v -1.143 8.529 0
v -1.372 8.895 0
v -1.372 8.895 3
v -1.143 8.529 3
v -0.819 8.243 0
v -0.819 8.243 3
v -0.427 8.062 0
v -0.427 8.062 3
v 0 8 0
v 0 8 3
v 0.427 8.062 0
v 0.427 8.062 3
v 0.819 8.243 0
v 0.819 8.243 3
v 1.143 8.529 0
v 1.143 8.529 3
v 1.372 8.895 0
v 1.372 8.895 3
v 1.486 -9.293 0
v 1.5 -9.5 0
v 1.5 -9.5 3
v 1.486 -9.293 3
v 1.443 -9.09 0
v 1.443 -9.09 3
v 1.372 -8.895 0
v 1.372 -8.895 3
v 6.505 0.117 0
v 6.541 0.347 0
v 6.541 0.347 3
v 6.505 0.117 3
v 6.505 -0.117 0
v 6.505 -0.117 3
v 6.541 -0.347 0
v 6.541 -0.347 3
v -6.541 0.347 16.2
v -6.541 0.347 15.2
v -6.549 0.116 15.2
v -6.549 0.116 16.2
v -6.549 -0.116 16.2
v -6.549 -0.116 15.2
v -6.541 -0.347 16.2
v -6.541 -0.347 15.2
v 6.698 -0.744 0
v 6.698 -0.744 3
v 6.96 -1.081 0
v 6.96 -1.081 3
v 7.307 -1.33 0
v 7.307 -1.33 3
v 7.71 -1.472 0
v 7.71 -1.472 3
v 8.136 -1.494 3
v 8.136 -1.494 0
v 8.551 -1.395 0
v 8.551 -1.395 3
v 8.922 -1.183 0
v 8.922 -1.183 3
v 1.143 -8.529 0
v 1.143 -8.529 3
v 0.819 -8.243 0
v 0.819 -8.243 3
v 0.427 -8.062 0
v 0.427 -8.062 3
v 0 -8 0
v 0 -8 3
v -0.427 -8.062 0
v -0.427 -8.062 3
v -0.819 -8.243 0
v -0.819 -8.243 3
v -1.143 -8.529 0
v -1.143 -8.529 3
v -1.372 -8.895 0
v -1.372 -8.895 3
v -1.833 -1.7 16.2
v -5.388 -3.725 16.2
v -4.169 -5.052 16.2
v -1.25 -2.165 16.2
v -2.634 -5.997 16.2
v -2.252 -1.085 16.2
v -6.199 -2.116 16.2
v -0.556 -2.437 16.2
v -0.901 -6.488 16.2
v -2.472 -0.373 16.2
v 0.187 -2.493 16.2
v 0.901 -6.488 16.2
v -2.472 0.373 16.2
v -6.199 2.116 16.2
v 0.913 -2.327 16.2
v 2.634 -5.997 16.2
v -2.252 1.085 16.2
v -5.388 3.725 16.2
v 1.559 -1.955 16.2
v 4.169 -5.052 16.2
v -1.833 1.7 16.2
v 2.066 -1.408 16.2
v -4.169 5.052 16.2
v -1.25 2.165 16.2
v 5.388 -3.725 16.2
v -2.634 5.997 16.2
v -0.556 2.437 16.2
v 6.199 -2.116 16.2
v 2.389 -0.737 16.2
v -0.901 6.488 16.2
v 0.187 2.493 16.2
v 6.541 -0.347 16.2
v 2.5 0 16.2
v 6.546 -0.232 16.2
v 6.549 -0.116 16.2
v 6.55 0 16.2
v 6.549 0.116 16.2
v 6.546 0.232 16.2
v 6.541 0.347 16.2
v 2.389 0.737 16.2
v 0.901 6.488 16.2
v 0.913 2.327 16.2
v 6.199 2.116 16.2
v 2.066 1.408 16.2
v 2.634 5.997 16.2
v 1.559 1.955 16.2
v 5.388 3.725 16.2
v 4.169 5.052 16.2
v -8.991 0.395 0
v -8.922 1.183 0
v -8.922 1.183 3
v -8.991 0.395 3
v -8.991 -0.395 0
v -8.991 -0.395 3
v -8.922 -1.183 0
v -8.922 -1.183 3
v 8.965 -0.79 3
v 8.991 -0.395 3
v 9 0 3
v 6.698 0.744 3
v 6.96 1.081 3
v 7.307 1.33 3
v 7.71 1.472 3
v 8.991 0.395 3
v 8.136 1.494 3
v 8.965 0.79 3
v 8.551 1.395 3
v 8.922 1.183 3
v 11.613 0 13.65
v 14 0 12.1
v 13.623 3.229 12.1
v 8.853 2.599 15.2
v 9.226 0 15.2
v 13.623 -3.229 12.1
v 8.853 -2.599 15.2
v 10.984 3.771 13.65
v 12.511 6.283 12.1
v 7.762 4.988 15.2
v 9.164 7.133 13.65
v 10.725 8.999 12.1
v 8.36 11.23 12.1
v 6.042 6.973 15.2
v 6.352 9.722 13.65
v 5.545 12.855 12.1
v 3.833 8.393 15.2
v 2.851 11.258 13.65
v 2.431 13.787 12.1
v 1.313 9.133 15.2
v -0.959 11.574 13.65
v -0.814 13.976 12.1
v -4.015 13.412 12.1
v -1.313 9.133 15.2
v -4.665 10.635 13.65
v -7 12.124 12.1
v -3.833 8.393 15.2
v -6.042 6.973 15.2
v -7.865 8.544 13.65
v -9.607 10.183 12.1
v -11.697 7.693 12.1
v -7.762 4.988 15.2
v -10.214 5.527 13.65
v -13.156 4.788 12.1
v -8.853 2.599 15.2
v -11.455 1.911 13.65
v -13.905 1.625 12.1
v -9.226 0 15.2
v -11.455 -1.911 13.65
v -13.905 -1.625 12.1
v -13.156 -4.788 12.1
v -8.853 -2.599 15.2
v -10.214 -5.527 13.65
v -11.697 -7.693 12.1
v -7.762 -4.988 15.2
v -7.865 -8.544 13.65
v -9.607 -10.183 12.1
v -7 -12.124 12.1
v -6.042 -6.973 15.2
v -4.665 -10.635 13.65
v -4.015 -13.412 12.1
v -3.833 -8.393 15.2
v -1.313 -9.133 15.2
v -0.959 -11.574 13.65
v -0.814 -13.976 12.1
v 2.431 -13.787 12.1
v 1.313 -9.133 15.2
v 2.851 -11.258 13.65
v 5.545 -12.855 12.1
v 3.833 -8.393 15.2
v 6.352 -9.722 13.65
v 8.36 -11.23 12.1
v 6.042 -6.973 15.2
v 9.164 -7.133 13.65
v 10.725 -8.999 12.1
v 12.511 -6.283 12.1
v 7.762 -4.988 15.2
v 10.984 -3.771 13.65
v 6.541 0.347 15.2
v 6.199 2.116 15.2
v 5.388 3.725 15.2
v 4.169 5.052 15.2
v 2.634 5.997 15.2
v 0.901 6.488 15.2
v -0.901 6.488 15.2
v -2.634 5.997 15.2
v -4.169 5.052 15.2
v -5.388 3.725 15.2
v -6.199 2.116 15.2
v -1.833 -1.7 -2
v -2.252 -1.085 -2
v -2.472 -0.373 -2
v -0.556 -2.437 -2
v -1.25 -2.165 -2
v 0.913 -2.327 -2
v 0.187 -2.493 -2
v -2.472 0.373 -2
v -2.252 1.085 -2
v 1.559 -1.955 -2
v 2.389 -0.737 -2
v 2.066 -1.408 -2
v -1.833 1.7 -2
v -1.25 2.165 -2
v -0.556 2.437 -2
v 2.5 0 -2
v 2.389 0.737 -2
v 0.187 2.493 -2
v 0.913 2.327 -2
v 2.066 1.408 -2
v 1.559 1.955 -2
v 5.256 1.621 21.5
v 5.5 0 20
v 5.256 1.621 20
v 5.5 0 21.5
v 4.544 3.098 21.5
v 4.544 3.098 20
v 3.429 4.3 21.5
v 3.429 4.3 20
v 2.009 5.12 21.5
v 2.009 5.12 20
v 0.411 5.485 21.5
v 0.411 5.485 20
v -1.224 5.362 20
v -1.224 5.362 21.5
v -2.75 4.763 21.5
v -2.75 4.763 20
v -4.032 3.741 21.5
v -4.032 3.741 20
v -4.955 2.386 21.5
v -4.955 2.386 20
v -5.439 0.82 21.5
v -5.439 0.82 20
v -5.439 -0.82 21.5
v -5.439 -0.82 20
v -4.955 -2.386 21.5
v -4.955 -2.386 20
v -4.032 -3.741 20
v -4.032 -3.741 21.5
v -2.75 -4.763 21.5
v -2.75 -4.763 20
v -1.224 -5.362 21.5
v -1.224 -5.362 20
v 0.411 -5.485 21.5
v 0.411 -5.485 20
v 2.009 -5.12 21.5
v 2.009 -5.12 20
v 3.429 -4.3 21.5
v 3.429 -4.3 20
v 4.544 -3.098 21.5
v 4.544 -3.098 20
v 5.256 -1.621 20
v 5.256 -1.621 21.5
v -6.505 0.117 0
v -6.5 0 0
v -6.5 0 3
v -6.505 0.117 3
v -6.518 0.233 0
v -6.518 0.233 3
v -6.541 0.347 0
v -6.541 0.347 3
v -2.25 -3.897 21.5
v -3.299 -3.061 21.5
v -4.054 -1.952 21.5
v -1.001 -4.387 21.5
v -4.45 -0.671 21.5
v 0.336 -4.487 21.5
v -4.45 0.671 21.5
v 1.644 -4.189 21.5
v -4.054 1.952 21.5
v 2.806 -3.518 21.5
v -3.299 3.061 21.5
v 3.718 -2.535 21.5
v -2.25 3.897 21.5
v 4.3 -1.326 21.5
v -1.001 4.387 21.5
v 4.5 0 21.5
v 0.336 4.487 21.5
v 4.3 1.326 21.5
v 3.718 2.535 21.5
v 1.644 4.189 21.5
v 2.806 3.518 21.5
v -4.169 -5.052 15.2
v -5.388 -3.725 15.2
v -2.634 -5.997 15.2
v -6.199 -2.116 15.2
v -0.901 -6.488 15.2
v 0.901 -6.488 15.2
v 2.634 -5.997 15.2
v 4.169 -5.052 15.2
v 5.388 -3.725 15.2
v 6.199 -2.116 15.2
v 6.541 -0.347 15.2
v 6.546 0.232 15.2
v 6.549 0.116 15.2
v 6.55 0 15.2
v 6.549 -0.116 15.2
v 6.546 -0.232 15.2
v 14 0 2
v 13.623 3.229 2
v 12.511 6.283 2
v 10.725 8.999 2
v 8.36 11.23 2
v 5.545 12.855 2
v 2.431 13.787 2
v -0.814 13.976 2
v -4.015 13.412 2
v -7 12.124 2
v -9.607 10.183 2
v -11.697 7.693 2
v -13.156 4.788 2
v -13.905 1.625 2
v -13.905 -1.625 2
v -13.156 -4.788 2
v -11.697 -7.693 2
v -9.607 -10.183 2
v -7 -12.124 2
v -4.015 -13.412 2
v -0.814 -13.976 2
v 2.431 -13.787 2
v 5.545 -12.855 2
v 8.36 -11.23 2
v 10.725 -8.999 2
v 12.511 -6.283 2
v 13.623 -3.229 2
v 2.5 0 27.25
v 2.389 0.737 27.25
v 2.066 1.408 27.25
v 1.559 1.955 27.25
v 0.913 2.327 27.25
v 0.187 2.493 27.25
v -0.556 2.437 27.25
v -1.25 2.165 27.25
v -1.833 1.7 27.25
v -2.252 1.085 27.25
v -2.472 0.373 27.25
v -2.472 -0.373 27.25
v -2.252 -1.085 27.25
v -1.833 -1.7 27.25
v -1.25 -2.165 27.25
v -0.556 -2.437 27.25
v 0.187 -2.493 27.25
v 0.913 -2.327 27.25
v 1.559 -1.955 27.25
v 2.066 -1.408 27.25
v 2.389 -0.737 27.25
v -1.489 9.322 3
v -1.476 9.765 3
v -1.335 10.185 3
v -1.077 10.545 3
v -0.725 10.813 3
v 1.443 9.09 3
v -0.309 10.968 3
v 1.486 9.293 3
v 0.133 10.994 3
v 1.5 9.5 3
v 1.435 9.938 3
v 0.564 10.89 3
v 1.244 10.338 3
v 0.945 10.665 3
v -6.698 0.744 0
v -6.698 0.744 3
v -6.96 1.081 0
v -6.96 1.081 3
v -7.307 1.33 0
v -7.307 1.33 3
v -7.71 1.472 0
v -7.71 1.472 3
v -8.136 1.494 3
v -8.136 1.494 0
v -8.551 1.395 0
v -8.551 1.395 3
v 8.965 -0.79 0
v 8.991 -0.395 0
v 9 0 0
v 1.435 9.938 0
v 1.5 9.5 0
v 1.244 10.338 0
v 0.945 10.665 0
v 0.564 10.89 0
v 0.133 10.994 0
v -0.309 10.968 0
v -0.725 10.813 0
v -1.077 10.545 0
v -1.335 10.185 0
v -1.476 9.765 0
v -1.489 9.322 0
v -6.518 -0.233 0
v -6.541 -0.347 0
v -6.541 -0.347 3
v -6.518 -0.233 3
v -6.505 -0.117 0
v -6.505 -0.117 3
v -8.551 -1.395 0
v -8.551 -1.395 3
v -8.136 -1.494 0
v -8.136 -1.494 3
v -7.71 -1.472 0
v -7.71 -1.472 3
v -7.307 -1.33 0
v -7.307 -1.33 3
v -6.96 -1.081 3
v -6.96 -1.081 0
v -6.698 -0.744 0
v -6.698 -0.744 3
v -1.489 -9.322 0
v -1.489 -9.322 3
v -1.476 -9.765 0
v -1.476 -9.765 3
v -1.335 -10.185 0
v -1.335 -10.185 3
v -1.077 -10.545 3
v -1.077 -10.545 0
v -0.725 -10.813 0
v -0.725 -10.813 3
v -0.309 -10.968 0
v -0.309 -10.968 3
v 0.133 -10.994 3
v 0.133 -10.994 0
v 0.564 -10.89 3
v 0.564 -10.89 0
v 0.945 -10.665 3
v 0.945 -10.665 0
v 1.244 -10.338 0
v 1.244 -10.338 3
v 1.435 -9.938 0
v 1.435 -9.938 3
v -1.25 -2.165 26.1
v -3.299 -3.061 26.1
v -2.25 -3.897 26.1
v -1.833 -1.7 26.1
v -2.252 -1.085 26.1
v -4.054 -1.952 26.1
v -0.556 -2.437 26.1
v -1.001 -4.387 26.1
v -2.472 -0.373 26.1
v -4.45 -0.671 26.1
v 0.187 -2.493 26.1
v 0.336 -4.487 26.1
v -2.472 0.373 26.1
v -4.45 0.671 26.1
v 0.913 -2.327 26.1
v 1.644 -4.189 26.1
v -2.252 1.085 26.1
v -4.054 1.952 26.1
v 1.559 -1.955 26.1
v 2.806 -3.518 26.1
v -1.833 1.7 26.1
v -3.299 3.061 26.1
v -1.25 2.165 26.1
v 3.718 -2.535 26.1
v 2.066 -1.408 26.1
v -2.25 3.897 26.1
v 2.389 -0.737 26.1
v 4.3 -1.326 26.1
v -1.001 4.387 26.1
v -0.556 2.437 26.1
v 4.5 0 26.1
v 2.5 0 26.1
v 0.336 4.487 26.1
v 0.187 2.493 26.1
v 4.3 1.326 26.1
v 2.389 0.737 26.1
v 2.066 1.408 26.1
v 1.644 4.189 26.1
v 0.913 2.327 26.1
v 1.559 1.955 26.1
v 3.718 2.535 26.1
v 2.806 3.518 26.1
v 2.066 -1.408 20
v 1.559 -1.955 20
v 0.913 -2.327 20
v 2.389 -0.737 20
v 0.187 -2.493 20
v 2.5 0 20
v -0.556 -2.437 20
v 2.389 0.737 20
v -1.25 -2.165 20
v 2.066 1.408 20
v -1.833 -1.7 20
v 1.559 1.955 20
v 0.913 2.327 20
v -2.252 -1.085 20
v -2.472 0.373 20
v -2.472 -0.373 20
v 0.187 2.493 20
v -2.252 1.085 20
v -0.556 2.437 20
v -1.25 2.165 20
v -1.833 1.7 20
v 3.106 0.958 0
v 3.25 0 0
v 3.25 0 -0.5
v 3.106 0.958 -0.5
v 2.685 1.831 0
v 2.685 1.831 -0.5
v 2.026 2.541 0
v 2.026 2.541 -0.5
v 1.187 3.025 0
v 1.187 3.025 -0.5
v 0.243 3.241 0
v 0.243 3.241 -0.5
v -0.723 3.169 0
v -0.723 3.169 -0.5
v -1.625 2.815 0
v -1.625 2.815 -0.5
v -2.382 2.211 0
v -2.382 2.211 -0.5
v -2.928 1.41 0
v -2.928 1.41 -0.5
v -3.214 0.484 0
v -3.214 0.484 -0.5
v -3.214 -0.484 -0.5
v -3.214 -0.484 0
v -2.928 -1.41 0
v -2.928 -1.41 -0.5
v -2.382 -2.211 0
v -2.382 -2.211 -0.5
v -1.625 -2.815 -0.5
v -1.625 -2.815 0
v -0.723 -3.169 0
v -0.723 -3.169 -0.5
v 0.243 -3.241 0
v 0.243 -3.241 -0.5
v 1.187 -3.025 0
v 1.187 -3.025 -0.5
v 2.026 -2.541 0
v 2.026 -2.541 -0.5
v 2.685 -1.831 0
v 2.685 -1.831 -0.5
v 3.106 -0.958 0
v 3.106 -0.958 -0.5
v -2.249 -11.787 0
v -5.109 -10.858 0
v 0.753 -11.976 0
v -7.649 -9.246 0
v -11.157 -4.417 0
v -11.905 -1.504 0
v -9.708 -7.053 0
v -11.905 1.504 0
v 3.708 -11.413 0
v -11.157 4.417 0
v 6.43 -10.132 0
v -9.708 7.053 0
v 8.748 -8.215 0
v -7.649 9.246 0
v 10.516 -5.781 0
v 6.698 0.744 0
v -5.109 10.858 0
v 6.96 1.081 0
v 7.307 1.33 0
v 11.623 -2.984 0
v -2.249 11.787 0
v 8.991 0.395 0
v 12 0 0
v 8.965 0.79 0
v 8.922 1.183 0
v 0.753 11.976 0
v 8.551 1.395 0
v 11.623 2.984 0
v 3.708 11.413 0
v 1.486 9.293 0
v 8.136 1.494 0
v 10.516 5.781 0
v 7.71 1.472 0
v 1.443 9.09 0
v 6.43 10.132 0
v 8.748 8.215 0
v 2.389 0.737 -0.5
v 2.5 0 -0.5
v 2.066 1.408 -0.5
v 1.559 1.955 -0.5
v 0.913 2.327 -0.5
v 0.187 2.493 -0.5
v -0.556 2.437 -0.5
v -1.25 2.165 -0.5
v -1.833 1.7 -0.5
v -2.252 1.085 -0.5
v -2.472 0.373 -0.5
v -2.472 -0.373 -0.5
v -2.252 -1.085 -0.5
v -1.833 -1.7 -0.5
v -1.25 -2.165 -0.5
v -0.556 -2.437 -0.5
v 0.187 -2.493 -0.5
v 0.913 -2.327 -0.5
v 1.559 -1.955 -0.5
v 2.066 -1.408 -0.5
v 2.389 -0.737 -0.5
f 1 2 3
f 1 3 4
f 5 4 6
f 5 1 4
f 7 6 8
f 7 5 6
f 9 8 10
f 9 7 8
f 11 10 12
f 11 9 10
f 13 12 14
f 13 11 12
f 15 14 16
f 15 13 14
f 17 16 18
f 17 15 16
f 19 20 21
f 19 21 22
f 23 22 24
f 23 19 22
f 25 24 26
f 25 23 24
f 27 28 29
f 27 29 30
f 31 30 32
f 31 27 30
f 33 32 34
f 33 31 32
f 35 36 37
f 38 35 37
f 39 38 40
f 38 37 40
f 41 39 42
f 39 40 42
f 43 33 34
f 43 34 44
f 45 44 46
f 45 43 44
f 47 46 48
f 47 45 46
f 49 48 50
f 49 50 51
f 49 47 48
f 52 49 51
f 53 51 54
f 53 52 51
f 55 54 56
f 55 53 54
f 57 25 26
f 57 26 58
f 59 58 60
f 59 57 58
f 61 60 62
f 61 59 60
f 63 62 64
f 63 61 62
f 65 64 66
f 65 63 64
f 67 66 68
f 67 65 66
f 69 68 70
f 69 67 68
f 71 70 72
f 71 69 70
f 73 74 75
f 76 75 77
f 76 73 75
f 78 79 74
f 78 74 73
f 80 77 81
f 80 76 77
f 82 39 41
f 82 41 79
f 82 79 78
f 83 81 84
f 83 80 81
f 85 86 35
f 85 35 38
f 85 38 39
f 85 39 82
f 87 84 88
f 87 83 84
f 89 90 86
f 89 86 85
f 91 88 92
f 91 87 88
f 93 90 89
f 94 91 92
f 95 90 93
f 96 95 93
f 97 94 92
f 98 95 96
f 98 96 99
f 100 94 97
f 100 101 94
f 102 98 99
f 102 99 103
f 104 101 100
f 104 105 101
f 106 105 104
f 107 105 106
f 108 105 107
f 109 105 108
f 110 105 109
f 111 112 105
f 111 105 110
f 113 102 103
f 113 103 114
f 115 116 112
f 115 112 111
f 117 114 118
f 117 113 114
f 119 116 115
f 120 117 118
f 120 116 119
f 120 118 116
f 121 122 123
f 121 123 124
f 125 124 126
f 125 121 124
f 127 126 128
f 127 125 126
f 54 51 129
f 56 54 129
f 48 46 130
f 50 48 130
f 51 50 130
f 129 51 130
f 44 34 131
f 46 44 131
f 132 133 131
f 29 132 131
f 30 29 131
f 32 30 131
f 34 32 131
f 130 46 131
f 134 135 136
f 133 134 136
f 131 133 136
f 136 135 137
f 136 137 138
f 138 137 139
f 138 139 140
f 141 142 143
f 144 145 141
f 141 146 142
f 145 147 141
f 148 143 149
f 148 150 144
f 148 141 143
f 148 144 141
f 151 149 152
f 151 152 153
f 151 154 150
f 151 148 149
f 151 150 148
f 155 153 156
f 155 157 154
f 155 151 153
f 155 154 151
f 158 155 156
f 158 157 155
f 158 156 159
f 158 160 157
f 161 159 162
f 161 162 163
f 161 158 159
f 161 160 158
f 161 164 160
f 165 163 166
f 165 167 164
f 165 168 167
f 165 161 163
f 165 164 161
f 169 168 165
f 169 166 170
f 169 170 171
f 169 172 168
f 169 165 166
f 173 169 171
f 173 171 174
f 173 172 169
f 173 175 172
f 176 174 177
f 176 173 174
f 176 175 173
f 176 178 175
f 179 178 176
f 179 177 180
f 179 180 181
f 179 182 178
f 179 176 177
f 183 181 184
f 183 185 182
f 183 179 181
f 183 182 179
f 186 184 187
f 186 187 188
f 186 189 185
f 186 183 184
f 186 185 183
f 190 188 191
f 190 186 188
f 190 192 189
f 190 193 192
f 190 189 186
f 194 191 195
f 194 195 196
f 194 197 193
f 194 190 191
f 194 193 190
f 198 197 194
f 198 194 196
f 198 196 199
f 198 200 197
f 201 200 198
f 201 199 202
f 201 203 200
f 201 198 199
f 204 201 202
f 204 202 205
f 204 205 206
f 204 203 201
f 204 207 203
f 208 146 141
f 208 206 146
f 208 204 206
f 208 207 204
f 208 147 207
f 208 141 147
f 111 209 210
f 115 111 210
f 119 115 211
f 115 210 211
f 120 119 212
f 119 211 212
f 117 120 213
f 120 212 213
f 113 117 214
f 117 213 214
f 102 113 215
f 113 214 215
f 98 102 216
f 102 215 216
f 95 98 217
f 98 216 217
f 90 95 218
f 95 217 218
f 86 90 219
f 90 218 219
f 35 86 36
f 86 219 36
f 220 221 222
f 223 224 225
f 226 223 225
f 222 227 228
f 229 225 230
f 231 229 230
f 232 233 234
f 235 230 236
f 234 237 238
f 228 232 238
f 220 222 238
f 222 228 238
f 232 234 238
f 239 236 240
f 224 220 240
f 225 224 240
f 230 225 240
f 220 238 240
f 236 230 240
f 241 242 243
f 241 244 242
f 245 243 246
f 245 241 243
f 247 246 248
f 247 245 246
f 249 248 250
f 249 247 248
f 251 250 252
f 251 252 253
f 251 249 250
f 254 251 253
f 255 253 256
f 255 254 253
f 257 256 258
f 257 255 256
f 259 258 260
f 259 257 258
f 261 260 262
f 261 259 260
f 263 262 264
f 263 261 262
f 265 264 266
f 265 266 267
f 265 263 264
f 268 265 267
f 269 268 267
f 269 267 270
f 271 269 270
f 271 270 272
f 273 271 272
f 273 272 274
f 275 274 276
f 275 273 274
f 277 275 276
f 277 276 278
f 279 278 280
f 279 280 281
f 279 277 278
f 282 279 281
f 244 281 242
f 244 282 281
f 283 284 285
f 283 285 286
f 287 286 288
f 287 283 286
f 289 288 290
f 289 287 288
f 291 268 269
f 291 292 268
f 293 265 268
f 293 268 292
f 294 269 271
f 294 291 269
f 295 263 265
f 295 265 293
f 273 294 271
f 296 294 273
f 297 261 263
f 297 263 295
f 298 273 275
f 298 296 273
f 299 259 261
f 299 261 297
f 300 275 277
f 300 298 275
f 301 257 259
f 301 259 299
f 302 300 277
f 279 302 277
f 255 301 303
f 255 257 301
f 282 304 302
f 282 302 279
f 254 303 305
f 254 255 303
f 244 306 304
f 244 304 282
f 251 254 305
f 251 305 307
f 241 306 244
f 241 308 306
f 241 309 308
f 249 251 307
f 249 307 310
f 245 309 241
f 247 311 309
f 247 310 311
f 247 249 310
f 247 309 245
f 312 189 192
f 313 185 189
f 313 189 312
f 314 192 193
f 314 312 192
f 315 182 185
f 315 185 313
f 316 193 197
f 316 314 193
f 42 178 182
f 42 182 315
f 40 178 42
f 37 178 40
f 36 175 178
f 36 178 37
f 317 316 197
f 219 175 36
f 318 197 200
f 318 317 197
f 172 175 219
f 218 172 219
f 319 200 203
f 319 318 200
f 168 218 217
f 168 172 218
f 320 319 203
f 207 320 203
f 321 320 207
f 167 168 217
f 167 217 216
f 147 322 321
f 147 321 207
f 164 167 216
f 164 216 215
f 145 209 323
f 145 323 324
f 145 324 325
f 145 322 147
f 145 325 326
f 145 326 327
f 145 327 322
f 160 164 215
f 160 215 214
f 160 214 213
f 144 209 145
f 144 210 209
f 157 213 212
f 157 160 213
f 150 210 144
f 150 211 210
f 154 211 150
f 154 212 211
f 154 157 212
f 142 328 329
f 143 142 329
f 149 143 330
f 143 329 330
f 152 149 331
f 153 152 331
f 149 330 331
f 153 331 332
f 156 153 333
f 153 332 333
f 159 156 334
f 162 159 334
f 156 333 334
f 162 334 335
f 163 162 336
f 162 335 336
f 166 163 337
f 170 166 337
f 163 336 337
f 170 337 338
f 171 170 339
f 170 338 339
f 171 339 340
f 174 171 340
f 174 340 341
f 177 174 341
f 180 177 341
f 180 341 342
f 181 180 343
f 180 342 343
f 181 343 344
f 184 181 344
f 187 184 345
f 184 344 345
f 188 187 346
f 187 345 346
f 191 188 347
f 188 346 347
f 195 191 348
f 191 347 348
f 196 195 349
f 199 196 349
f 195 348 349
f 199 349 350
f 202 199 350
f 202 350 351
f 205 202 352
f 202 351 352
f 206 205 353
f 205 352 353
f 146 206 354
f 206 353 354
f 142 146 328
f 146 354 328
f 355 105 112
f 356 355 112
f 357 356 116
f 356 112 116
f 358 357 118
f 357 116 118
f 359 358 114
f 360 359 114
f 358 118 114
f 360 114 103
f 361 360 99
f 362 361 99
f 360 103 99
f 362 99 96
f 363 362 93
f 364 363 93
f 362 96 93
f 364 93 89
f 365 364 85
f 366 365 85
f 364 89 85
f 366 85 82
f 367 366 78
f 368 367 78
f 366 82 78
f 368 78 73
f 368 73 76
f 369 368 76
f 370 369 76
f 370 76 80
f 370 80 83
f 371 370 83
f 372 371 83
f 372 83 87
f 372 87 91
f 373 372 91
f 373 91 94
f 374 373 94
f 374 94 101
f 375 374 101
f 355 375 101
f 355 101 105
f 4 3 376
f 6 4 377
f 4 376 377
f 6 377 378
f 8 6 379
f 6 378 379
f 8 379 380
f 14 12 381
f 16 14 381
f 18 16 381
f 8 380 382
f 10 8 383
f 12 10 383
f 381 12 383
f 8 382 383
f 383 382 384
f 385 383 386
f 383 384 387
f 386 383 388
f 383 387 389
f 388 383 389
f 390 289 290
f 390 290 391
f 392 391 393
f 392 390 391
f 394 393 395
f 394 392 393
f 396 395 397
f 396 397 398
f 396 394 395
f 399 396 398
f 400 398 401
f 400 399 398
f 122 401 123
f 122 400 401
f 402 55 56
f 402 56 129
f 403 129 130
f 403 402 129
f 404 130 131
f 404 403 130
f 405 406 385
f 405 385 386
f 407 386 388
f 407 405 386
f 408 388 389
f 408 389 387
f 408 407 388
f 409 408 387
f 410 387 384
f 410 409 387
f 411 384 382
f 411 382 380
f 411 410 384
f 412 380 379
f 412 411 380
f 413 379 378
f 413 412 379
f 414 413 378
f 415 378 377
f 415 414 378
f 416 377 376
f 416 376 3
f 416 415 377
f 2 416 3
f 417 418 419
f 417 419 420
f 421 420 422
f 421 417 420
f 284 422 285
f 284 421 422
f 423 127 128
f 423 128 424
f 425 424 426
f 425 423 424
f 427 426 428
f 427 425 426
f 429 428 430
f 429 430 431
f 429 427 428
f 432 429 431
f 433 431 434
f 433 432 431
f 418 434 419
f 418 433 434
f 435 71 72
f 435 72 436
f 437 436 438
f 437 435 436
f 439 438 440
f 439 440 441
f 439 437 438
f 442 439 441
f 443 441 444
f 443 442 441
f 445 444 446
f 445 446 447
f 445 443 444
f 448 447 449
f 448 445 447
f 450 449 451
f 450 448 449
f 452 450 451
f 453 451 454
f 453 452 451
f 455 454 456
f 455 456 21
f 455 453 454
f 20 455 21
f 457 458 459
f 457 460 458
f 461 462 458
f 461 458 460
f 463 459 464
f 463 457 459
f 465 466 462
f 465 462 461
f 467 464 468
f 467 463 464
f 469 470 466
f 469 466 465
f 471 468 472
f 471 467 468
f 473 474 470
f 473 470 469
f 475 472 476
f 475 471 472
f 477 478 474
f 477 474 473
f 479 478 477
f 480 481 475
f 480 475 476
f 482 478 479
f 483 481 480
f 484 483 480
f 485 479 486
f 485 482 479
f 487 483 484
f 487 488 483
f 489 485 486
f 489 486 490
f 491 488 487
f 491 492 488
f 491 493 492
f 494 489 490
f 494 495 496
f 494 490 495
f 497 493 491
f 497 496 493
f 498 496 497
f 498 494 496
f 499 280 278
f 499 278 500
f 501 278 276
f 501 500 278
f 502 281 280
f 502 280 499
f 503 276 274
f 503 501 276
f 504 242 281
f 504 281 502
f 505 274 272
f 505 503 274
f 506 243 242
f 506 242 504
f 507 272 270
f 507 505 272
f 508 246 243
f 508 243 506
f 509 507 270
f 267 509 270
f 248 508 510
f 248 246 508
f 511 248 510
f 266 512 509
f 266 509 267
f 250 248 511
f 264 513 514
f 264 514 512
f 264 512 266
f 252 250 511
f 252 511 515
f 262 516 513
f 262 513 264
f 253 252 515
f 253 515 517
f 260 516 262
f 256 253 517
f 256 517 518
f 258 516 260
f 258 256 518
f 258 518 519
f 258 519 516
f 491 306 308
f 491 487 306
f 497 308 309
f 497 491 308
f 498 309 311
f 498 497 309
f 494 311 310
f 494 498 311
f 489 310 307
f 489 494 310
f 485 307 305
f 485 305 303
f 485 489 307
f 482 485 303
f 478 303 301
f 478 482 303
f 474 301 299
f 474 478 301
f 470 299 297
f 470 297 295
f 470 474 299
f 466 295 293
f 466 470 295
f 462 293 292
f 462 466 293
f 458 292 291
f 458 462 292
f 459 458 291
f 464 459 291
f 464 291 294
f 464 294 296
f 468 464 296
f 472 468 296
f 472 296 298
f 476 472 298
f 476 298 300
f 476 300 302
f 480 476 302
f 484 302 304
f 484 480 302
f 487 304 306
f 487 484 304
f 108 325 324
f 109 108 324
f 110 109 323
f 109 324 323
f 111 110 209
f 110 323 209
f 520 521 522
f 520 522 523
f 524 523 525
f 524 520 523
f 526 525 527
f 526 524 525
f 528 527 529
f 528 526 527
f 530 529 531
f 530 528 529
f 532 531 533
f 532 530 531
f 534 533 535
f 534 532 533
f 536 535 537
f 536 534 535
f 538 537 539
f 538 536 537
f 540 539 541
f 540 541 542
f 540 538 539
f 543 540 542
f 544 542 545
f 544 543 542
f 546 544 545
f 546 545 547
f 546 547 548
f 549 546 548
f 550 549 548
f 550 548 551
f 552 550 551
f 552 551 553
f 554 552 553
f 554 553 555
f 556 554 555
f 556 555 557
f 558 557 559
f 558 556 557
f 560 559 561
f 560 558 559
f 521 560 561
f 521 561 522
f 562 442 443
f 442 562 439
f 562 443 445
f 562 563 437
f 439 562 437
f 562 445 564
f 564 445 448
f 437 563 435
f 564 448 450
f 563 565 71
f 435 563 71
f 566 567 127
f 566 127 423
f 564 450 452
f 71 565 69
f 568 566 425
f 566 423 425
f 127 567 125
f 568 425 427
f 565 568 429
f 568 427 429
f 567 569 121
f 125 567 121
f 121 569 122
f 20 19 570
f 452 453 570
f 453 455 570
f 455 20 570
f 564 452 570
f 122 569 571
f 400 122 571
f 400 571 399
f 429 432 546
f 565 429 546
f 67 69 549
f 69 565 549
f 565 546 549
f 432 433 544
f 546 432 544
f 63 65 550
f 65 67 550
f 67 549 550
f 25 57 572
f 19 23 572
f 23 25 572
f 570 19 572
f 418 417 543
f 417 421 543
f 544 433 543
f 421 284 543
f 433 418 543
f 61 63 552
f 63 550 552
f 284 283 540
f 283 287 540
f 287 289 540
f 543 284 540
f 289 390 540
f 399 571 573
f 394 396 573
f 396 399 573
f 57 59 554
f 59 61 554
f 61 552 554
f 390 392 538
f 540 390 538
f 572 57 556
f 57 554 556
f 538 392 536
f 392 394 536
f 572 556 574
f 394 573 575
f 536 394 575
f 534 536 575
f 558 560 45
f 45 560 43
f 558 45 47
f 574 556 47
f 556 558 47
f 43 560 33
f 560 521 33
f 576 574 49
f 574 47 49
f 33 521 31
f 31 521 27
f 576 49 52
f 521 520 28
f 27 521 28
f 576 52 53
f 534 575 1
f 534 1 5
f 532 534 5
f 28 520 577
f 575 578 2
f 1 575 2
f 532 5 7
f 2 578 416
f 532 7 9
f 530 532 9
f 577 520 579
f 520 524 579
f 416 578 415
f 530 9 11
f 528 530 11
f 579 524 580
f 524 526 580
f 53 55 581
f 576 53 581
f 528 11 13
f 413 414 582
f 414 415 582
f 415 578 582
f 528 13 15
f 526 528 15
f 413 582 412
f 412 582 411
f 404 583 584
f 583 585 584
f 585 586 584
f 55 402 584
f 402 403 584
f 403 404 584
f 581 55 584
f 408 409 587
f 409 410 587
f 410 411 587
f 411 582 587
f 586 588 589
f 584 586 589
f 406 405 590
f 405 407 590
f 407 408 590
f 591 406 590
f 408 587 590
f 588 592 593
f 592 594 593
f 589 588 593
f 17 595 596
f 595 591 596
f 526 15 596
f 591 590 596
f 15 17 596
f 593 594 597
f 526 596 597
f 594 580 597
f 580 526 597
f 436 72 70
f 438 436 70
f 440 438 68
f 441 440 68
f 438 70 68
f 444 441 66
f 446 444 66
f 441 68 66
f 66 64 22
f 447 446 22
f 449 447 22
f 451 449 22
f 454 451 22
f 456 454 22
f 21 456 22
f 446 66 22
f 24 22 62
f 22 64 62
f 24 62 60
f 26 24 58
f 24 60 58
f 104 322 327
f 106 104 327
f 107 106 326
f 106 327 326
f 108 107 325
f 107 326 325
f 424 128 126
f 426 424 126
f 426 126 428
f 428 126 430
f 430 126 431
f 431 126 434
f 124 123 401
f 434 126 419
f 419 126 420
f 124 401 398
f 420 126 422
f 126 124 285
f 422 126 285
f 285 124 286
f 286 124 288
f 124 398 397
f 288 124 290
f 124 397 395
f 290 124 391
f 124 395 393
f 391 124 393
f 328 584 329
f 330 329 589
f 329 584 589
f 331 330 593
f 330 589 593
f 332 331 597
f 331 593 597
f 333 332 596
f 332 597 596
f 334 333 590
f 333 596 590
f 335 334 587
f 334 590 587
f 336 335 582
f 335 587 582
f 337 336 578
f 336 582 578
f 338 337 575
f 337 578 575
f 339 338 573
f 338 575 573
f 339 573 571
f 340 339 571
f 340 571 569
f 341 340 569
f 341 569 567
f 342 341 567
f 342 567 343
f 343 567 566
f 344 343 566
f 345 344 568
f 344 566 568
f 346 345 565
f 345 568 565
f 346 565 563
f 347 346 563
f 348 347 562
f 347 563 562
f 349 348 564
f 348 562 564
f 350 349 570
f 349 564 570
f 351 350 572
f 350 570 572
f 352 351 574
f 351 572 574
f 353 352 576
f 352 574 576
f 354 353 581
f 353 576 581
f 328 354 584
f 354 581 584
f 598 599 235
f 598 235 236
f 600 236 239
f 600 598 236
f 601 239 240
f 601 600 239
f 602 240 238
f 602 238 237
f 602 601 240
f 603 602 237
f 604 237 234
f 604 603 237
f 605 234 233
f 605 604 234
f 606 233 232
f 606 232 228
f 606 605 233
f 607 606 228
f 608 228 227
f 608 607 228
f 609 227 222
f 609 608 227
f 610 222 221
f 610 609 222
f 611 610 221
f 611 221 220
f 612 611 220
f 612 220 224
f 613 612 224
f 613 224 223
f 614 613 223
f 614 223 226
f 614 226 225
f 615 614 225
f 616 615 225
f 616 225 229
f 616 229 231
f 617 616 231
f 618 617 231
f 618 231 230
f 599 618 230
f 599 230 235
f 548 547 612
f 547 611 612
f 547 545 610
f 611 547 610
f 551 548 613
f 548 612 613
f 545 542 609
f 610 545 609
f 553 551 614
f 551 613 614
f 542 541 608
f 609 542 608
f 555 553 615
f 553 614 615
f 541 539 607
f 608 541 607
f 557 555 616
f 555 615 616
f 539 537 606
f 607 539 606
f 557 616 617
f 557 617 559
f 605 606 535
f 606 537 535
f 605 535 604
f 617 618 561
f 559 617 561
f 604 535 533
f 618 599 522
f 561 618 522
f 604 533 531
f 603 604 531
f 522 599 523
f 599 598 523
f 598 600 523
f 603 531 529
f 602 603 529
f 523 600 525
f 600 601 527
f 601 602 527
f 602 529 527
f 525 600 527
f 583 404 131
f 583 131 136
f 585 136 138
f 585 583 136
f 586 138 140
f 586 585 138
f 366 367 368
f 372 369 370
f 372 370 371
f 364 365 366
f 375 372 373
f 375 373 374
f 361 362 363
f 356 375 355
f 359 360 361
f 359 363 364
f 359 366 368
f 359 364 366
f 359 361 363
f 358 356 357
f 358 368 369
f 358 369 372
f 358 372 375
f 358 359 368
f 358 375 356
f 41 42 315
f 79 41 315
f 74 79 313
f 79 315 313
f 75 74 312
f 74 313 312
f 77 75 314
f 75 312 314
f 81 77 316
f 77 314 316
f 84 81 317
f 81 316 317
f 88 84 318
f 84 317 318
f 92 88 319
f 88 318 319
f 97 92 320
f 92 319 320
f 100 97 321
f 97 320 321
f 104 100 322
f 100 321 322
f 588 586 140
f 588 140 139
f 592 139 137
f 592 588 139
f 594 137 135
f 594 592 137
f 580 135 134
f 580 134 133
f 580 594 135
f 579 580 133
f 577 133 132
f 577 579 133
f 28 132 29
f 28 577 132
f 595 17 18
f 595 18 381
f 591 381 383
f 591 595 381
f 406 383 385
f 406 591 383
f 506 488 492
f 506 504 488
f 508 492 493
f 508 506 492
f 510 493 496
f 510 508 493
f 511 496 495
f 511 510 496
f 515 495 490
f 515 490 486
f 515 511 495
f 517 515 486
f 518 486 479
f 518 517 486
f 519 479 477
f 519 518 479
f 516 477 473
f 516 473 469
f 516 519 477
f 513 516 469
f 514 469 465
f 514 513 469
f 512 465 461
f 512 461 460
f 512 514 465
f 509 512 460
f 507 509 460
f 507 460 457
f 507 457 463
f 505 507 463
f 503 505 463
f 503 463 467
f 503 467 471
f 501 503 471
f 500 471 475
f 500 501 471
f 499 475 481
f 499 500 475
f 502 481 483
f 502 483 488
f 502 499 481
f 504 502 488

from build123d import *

# Parameters (mm, degrees)
F0_R          = 14
F1_DEPTH      = 15.2
F0_R_2        = 3.25
F0_R_3        = 2.5
F2_DEPTH      = 16.2
F3_DEPTH      = 27.25
F3_DEPTH_BACK = 2
F4_DEPTH      = 0.5
F5_SIZE2      = 4.7735813878
F5_SIZE       = 3.1
F6_SIZE2      = 2
F6_SIZE       = 2
F9_DEPTH      = 3


with BuildPart() as f1:
    # F0 (on Top) → F1 (new body)
    with BuildSketch(Plane.XY):
        Circle(F0_R)
        with BuildLine():
            ThreePointArc((1.3724636643, 8.8947368421), (6.4311742363, 6.2960303321), (8.921875, 1.1832778559))
            ThreePointArc((8.921875, 1.1832778559), (9.3477411658, 0.6584783596), (9.5, 0))
            ThreePointArc((9.5, 0), (9.3477411658, -0.6584783596), (8.921875, -1.1832778559))
            ThreePointArc((8.921875, -1.1832778559), (6.4311742363, -6.2960303321), (1.3724636643, -8.8947368421))
            ThreePointArc((1.3724636643, -8.8947368421), (1.4677696509, -9.1907230177), (1.5, -9.5))
            ThreePointArc((1.5, -9.5), (-0.3092769823, -10.9677696509), (-1.3724636643, -8.8947368421))
            ThreePointArc((-1.3724636643, -8.8947368421), (-6.4311742363, -6.2960303321), (-8.921875, -1.1832778559))
            ThreePointArc((-8.921875, -1.1832778559), (-9.5, 0), (-8.921875, 1.1832778559))
            ThreePointArc((-8.921875, 1.1832778559), (-6.4311742363, 6.2960303321), (-1.3724636643, 8.8947368421))
            ThreePointArc((-1.3724636643, 8.8947368421), (-0.3092769823, 10.9677696509), (1.5, 9.5))
            ThreePointArc((1.5, 9.5), (1.4677696509, 9.1907230177), (1.3724636643, 8.8947368421))
        make_face(mode=Mode.SUBTRACT)
        with BuildLine():
            ThreePointArc((-6.54078125, -0.3473911911), (-6.55, 0), (-6.54078125, 0.3473911911))
            ThreePointArc((-6.54078125, 0.3473911911), (-7.5031487088, 1.4153228587), (-8.921875, 1.1832778559))
            ThreePointArc((-8.921875, 1.1832778559), (-9, 0), (-8.921875, -1.1832778559))
            ThreePointArc((-8.921875, -1.1832778559), (-7.5031487088, -1.4153228587), (-6.54078125, -0.3473911911))
        make_face()
        with BuildLine():
            ThreePointArc((6.54078125, 0.3473911911), (6.5476949069, 0.1737567445), (6.55, 0))
            ThreePointArc((6.55, 0), (6.5476949069, -0.1737567445), (6.54078125, -0.3473911911))
            ThreePointArc((6.54078125, -0.3473911911), (7.5031487088, -1.4153228587), (8.921875, -1.1832778559))
            ThreePointArc((8.921875, -1.1832778559), (8.9804475111, -0.5929270613), (9, 0))
            ThreePointArc((9, 0), (8.9804475111, 0.5929270613), (8.921875, 1.1832778559))
            ThreePointArc((8.921875, 1.1832778559), (7.5031487088, 1.4153228587), (6.54078125, 0.3473911911))
        make_face()
        with BuildLine():
            ThreePointArc((-1.3724636643, -8.8947368421), (0, -9), (1.3724636643, -8.8947368421))
            ThreePointArc((1.3724636643, -8.8947368421), (0, -8), (-1.3724636643, -8.8947368421))
        make_face()
        with BuildLine():
            ThreePointArc((1.5, -9.5), (1.4677696509, -9.1907230177), (1.3724636643, -8.8947368421))
            ThreePointArc((1.3724636643, -8.8947368421), (0, -9), (-1.3724636643, -8.8947368421))
            ThreePointArc((-1.3724636643, -8.8947368421), (-0.3092769823, -10.9677696509), (1.5, -9.5))
        make_face()
        with BuildLine():
            ThreePointArc((-1.3724636643, 8.8947368421), (0, 8), (1.3724636643, 8.8947368421))
            ThreePointArc((1.3724636643, 8.8947368421), (0, 9), (-1.3724636643, 8.8947368421))
        make_face()
        with BuildLine():
            ThreePointArc((-1.3724636643, 8.8947368421), (0, 9), (1.3724636643, 8.8947368421))
            ThreePointArc((1.3724636643, 8.8947368421), (1.4677696509, 9.1907230177), (1.5, 9.5))
            ThreePointArc((1.5, 9.5), (-0.3092769823, 10.9677696509), (-1.3724636643, 8.8947368421))
        make_face()
        with BuildLine():
            ThreePointArc((-8.921875, -1.1832778559), (-9, 0), (-8.921875, 1.1832778559))
            ThreePointArc((-8.921875, 1.1832778559), (-9.5, 0), (-8.921875, -1.1832778559))
        make_face()
        with BuildLine():
            ThreePointArc((9.5, 0), (9.3477411658, 0.6584783596), (8.921875, 1.1832778559))
            ThreePointArc((8.921875, 1.1832778559), (8.9804475111, 0.5929270613), (9, 0))
            ThreePointArc((9, 0), (8.9804475111, -0.5929270613), (8.921875, -1.1832778559))
            ThreePointArc((8.921875, -1.1832778559), (9.3477411658, -0.6584783596), (9.5, 0))
        make_face()
        with BuildLine():
            ThreePointArc((-6.54078125, 0.3473911911), (0, 6.55), (6.54078125, 0.3473911911))
            ThreePointArc((6.54078125, 0.3473911911), (7.5031487088, 1.4153228587), (8.921875, 1.1832778559))
            ThreePointArc((8.921875, 1.1832778559), (6.4311742363, 6.2960303321), (1.3724636643, 8.8947368421))
            ThreePointArc((1.3724636643, 8.8947368421), (0, 8), (-1.3724636643, 8.8947368421))
            ThreePointArc((-1.3724636643, 8.8947368421), (-6.4311742363, 6.2960303321), (-8.921875, 1.1832778559))
            ThreePointArc((-8.921875, 1.1832778559), (-7.5031487088, 1.4153228587), (-6.54078125, 0.3473911911))
        make_face()
        with BuildLine():
            ThreePointArc((8.921875, -1.1832778559), (7.5031487088, -1.4153228587), (6.54078125, -0.3473911911))
            ThreePointArc((6.54078125, -0.3473911911), (0, -6.55), (-6.54078125, -0.3473911911))
            ThreePointArc((-6.54078125, -0.3473911911), (-7.5031487088, -1.4153228587), (-8.921875, -1.1832778559))
            ThreePointArc((-8.921875, -1.1832778559), (-6.4311742363, -6.2960303321), (-1.3724636643, -8.8947368421))
            ThreePointArc((-1.3724636643, -8.8947368421), (0, -8), (1.3724636643, -8.8947368421))
            ThreePointArc((1.3724636643, -8.8947368421), (6.4311742363, -6.2960303321), (8.921875, -1.1832778559))
        make_face()
    extrude(amount=F1_DEPTH)



with BuildPart() as f1b:
    # F0 (on Top) → F1, piece 2 (new body)
    with BuildSketch(Plane.XY):
        Circle(F0_R_2)
        Circle(F0_R_3, mode=Mode.SUBTRACT)
        Circle(F0_R_3)
    extrude(amount=F1_DEPTH)


with BuildPart() as f1_1:
    add(f1.part)

    add(f1b.part)  # F2 merges F1b
    # F0 (on Top) → F2 (join)
    with BuildSketch(Plane.XY):
        with BuildLine():
            ThreePointArc((6.54078125, -0.3473911911), (6.5, 0), (6.54078125, 0.3473911911))
            ThreePointArc((6.54078125, 0.3473911911), (0, 6.55), (-6.54078125, 0.3473911911))
            ThreePointArc((-6.54078125, 0.3473911911), (-6.5102301982, 0.1748883572), (-6.5, 0))
            ThreePointArc((-6.5, 0), (-6.5102301982, -0.1748883572), (-6.54078125, -0.3473911911))
            ThreePointArc((-6.54078125, -0.3473911911), (0, -6.55), (6.54078125, -0.3473911911))
        make_face()
        Circle(F0_R_2, mode=Mode.SUBTRACT)
        with BuildLine():
            ThreePointArc((-6.5, 0), (-6.5102301982, 0.1748883572), (-6.54078125, 0.3473911911))
            ThreePointArc((-6.54078125, 0.3473911911), (-6.55, 0), (-6.54078125, -0.3473911911))
            ThreePointArc((-6.54078125, -0.3473911911), (-6.5102301982, -0.1748883572), (-6.5, 0))
        make_face()
        with BuildLine():
            ThreePointArc((6.54078125, -0.3473911911), (6.5476949069, -0.1737567445), (6.55, 0))
            ThreePointArc((6.55, 0), (6.5476949069, 0.1737567445), (6.54078125, 0.3473911911))
            ThreePointArc((6.54078125, 0.3473911911), (6.5, 0), (6.54078125, -0.3473911911))
        make_face()
        Circle(F0_R_2)
        Circle(F0_R_3, mode=Mode.SUBTRACT)
    extrude(amount=F2_DEPTH)

    # F0 (on Top) → F3 (join, two sides)
    with BuildSketch(Plane.XY) as f3_sk:
        Circle(F0_R_3)
    extrude(amount=F3_DEPTH)
    extrude(f3_sk.sketch, amount=-F3_DEPTH_BACK)

    # F0 (on Top) → F4 (join)
    with BuildSketch(Plane.XY):
        Circle(F0_R_2)
        Circle(F0_R_3, mode=Mode.SUBTRACT)
    extrude(amount=-F4_DEPTH)

    # F5
    f5_edges = [f1_1.edges().sort_by_distance(p)[0] for p in [
        (-14, 0, 15.2),
    ]]
    f5_side = f1_1.faces().sort_by_distance((-14, 0, 7.6))[0]
    chamfer(f5_edges, length=F5_SIZE, length2=F5_SIZE2, reference=f5_side)

    # F6
    f6_edges = [f1_1.edges().sort_by_distance(p)[0] for p in [
        (-14, 0, 0),
    ]]
    chamfer(f6_edges, length=F6_SIZE, length2=F6_SIZE2)

    # F0 (on Top) → F9 (cut)
    with BuildSketch(Plane.XY):
        with BuildLine():
            ThreePointArc((-6.5, 0), (-6.5102301982, 0.1748883572), (-6.54078125, 0.3473911911))
            ThreePointArc((-6.54078125, 0.3473911911), (-6.55, 0), (-6.54078125, -0.3473911911))
            ThreePointArc((-6.54078125, -0.3473911911), (-6.5102301982, -0.1748883572), (-6.5, 0))
        make_face()
        with BuildLine():
            ThreePointArc((-6.54078125, -0.3473911911), (-6.55, 0), (-6.54078125, 0.3473911911))
            ThreePointArc((-6.54078125, 0.3473911911), (-7.5031487088, 1.4153228587), (-8.921875, 1.1832778559))
            ThreePointArc((-8.921875, 1.1832778559), (-9, 0), (-8.921875, -1.1832778559))
            ThreePointArc((-8.921875, -1.1832778559), (-7.5031487088, -1.4153228587), (-6.54078125, -0.3473911911))
        make_face()
        with BuildLine():
            ThreePointArc((-1.3724636643, -8.8947368421), (0, -9), (1.3724636643, -8.8947368421))
            ThreePointArc((1.3724636643, -8.8947368421), (0, -8), (-1.3724636643, -8.8947368421))
        make_face()
        with BuildLine():
            ThreePointArc((1.5, -9.5), (1.4677696509, -9.1907230177), (1.3724636643, -8.8947368421))
            ThreePointArc((1.3724636643, -8.8947368421), (0, -9), (-1.3724636643, -8.8947368421))
            ThreePointArc((-1.3724636643, -8.8947368421), (-0.3092769823, -10.9677696509), (1.5, -9.5))
        make_face()
        with BuildLine():
            ThreePointArc((6.54078125, 0.3473911911), (6.5476949069, 0.1737567445), (6.55, 0))
            ThreePointArc((6.55, 0), (6.5476949069, -0.1737567445), (6.54078125, -0.3473911911))
            ThreePointArc((6.54078125, -0.3473911911), (7.5031487088, -1.4153228587), (8.921875, -1.1832778559))
            ThreePointArc((8.921875, -1.1832778559), (8.9804475111, -0.5929270613), (9, 0))
            ThreePointArc((9, 0), (8.9804475111, 0.5929270613), (8.921875, 1.1832778559))
            ThreePointArc((8.921875, 1.1832778559), (7.5031487088, 1.4153228587), (6.54078125, 0.3473911911))
        make_face()
        with BuildLine():
            ThreePointArc((6.54078125, -0.3473911911), (6.5476949069, -0.1737567445), (6.55, 0))
            ThreePointArc((6.55, 0), (6.5476949069, 0.1737567445), (6.54078125, 0.3473911911))
            ThreePointArc((6.54078125, 0.3473911911), (6.5, 0), (6.54078125, -0.3473911911))
        make_face()
        with BuildLine():
            ThreePointArc((-1.3724636643, 8.8947368421), (0, 8), (1.3724636643, 8.8947368421))
            ThreePointArc((1.3724636643, 8.8947368421), (0, 9), (-1.3724636643, 8.8947368421))
        make_face()
        with BuildLine():
            ThreePointArc((-1.3724636643, 8.8947368421), (0, 9), (1.3724636643, 8.8947368421))
            ThreePointArc((1.3724636643, 8.8947368421), (1.4677696509, 9.1907230177), (1.5, 9.5))
            ThreePointArc((1.5, 9.5), (-0.3092769823, 10.9677696509), (-1.3724636643, 8.8947368421))
        make_face()
    extrude(amount=F9_DEPTH, mode=Mode.SUBTRACT)


with BuildPart() as f8:
    # F7 (on Front) → F8 (revolve)
    with BuildSketch(Plane.XZ):
        Polygon((2.5, 26.1), (2.5, 20), (5.5, 20), (5.5, 21.5), (4.5, 21.5), (4.5, 26.1), align=None)
    revolve(axis=Axis((0, 0, 24.1000112146), (0, 0, 1)))


solid = Compound([f1_1.part, f8.part])
